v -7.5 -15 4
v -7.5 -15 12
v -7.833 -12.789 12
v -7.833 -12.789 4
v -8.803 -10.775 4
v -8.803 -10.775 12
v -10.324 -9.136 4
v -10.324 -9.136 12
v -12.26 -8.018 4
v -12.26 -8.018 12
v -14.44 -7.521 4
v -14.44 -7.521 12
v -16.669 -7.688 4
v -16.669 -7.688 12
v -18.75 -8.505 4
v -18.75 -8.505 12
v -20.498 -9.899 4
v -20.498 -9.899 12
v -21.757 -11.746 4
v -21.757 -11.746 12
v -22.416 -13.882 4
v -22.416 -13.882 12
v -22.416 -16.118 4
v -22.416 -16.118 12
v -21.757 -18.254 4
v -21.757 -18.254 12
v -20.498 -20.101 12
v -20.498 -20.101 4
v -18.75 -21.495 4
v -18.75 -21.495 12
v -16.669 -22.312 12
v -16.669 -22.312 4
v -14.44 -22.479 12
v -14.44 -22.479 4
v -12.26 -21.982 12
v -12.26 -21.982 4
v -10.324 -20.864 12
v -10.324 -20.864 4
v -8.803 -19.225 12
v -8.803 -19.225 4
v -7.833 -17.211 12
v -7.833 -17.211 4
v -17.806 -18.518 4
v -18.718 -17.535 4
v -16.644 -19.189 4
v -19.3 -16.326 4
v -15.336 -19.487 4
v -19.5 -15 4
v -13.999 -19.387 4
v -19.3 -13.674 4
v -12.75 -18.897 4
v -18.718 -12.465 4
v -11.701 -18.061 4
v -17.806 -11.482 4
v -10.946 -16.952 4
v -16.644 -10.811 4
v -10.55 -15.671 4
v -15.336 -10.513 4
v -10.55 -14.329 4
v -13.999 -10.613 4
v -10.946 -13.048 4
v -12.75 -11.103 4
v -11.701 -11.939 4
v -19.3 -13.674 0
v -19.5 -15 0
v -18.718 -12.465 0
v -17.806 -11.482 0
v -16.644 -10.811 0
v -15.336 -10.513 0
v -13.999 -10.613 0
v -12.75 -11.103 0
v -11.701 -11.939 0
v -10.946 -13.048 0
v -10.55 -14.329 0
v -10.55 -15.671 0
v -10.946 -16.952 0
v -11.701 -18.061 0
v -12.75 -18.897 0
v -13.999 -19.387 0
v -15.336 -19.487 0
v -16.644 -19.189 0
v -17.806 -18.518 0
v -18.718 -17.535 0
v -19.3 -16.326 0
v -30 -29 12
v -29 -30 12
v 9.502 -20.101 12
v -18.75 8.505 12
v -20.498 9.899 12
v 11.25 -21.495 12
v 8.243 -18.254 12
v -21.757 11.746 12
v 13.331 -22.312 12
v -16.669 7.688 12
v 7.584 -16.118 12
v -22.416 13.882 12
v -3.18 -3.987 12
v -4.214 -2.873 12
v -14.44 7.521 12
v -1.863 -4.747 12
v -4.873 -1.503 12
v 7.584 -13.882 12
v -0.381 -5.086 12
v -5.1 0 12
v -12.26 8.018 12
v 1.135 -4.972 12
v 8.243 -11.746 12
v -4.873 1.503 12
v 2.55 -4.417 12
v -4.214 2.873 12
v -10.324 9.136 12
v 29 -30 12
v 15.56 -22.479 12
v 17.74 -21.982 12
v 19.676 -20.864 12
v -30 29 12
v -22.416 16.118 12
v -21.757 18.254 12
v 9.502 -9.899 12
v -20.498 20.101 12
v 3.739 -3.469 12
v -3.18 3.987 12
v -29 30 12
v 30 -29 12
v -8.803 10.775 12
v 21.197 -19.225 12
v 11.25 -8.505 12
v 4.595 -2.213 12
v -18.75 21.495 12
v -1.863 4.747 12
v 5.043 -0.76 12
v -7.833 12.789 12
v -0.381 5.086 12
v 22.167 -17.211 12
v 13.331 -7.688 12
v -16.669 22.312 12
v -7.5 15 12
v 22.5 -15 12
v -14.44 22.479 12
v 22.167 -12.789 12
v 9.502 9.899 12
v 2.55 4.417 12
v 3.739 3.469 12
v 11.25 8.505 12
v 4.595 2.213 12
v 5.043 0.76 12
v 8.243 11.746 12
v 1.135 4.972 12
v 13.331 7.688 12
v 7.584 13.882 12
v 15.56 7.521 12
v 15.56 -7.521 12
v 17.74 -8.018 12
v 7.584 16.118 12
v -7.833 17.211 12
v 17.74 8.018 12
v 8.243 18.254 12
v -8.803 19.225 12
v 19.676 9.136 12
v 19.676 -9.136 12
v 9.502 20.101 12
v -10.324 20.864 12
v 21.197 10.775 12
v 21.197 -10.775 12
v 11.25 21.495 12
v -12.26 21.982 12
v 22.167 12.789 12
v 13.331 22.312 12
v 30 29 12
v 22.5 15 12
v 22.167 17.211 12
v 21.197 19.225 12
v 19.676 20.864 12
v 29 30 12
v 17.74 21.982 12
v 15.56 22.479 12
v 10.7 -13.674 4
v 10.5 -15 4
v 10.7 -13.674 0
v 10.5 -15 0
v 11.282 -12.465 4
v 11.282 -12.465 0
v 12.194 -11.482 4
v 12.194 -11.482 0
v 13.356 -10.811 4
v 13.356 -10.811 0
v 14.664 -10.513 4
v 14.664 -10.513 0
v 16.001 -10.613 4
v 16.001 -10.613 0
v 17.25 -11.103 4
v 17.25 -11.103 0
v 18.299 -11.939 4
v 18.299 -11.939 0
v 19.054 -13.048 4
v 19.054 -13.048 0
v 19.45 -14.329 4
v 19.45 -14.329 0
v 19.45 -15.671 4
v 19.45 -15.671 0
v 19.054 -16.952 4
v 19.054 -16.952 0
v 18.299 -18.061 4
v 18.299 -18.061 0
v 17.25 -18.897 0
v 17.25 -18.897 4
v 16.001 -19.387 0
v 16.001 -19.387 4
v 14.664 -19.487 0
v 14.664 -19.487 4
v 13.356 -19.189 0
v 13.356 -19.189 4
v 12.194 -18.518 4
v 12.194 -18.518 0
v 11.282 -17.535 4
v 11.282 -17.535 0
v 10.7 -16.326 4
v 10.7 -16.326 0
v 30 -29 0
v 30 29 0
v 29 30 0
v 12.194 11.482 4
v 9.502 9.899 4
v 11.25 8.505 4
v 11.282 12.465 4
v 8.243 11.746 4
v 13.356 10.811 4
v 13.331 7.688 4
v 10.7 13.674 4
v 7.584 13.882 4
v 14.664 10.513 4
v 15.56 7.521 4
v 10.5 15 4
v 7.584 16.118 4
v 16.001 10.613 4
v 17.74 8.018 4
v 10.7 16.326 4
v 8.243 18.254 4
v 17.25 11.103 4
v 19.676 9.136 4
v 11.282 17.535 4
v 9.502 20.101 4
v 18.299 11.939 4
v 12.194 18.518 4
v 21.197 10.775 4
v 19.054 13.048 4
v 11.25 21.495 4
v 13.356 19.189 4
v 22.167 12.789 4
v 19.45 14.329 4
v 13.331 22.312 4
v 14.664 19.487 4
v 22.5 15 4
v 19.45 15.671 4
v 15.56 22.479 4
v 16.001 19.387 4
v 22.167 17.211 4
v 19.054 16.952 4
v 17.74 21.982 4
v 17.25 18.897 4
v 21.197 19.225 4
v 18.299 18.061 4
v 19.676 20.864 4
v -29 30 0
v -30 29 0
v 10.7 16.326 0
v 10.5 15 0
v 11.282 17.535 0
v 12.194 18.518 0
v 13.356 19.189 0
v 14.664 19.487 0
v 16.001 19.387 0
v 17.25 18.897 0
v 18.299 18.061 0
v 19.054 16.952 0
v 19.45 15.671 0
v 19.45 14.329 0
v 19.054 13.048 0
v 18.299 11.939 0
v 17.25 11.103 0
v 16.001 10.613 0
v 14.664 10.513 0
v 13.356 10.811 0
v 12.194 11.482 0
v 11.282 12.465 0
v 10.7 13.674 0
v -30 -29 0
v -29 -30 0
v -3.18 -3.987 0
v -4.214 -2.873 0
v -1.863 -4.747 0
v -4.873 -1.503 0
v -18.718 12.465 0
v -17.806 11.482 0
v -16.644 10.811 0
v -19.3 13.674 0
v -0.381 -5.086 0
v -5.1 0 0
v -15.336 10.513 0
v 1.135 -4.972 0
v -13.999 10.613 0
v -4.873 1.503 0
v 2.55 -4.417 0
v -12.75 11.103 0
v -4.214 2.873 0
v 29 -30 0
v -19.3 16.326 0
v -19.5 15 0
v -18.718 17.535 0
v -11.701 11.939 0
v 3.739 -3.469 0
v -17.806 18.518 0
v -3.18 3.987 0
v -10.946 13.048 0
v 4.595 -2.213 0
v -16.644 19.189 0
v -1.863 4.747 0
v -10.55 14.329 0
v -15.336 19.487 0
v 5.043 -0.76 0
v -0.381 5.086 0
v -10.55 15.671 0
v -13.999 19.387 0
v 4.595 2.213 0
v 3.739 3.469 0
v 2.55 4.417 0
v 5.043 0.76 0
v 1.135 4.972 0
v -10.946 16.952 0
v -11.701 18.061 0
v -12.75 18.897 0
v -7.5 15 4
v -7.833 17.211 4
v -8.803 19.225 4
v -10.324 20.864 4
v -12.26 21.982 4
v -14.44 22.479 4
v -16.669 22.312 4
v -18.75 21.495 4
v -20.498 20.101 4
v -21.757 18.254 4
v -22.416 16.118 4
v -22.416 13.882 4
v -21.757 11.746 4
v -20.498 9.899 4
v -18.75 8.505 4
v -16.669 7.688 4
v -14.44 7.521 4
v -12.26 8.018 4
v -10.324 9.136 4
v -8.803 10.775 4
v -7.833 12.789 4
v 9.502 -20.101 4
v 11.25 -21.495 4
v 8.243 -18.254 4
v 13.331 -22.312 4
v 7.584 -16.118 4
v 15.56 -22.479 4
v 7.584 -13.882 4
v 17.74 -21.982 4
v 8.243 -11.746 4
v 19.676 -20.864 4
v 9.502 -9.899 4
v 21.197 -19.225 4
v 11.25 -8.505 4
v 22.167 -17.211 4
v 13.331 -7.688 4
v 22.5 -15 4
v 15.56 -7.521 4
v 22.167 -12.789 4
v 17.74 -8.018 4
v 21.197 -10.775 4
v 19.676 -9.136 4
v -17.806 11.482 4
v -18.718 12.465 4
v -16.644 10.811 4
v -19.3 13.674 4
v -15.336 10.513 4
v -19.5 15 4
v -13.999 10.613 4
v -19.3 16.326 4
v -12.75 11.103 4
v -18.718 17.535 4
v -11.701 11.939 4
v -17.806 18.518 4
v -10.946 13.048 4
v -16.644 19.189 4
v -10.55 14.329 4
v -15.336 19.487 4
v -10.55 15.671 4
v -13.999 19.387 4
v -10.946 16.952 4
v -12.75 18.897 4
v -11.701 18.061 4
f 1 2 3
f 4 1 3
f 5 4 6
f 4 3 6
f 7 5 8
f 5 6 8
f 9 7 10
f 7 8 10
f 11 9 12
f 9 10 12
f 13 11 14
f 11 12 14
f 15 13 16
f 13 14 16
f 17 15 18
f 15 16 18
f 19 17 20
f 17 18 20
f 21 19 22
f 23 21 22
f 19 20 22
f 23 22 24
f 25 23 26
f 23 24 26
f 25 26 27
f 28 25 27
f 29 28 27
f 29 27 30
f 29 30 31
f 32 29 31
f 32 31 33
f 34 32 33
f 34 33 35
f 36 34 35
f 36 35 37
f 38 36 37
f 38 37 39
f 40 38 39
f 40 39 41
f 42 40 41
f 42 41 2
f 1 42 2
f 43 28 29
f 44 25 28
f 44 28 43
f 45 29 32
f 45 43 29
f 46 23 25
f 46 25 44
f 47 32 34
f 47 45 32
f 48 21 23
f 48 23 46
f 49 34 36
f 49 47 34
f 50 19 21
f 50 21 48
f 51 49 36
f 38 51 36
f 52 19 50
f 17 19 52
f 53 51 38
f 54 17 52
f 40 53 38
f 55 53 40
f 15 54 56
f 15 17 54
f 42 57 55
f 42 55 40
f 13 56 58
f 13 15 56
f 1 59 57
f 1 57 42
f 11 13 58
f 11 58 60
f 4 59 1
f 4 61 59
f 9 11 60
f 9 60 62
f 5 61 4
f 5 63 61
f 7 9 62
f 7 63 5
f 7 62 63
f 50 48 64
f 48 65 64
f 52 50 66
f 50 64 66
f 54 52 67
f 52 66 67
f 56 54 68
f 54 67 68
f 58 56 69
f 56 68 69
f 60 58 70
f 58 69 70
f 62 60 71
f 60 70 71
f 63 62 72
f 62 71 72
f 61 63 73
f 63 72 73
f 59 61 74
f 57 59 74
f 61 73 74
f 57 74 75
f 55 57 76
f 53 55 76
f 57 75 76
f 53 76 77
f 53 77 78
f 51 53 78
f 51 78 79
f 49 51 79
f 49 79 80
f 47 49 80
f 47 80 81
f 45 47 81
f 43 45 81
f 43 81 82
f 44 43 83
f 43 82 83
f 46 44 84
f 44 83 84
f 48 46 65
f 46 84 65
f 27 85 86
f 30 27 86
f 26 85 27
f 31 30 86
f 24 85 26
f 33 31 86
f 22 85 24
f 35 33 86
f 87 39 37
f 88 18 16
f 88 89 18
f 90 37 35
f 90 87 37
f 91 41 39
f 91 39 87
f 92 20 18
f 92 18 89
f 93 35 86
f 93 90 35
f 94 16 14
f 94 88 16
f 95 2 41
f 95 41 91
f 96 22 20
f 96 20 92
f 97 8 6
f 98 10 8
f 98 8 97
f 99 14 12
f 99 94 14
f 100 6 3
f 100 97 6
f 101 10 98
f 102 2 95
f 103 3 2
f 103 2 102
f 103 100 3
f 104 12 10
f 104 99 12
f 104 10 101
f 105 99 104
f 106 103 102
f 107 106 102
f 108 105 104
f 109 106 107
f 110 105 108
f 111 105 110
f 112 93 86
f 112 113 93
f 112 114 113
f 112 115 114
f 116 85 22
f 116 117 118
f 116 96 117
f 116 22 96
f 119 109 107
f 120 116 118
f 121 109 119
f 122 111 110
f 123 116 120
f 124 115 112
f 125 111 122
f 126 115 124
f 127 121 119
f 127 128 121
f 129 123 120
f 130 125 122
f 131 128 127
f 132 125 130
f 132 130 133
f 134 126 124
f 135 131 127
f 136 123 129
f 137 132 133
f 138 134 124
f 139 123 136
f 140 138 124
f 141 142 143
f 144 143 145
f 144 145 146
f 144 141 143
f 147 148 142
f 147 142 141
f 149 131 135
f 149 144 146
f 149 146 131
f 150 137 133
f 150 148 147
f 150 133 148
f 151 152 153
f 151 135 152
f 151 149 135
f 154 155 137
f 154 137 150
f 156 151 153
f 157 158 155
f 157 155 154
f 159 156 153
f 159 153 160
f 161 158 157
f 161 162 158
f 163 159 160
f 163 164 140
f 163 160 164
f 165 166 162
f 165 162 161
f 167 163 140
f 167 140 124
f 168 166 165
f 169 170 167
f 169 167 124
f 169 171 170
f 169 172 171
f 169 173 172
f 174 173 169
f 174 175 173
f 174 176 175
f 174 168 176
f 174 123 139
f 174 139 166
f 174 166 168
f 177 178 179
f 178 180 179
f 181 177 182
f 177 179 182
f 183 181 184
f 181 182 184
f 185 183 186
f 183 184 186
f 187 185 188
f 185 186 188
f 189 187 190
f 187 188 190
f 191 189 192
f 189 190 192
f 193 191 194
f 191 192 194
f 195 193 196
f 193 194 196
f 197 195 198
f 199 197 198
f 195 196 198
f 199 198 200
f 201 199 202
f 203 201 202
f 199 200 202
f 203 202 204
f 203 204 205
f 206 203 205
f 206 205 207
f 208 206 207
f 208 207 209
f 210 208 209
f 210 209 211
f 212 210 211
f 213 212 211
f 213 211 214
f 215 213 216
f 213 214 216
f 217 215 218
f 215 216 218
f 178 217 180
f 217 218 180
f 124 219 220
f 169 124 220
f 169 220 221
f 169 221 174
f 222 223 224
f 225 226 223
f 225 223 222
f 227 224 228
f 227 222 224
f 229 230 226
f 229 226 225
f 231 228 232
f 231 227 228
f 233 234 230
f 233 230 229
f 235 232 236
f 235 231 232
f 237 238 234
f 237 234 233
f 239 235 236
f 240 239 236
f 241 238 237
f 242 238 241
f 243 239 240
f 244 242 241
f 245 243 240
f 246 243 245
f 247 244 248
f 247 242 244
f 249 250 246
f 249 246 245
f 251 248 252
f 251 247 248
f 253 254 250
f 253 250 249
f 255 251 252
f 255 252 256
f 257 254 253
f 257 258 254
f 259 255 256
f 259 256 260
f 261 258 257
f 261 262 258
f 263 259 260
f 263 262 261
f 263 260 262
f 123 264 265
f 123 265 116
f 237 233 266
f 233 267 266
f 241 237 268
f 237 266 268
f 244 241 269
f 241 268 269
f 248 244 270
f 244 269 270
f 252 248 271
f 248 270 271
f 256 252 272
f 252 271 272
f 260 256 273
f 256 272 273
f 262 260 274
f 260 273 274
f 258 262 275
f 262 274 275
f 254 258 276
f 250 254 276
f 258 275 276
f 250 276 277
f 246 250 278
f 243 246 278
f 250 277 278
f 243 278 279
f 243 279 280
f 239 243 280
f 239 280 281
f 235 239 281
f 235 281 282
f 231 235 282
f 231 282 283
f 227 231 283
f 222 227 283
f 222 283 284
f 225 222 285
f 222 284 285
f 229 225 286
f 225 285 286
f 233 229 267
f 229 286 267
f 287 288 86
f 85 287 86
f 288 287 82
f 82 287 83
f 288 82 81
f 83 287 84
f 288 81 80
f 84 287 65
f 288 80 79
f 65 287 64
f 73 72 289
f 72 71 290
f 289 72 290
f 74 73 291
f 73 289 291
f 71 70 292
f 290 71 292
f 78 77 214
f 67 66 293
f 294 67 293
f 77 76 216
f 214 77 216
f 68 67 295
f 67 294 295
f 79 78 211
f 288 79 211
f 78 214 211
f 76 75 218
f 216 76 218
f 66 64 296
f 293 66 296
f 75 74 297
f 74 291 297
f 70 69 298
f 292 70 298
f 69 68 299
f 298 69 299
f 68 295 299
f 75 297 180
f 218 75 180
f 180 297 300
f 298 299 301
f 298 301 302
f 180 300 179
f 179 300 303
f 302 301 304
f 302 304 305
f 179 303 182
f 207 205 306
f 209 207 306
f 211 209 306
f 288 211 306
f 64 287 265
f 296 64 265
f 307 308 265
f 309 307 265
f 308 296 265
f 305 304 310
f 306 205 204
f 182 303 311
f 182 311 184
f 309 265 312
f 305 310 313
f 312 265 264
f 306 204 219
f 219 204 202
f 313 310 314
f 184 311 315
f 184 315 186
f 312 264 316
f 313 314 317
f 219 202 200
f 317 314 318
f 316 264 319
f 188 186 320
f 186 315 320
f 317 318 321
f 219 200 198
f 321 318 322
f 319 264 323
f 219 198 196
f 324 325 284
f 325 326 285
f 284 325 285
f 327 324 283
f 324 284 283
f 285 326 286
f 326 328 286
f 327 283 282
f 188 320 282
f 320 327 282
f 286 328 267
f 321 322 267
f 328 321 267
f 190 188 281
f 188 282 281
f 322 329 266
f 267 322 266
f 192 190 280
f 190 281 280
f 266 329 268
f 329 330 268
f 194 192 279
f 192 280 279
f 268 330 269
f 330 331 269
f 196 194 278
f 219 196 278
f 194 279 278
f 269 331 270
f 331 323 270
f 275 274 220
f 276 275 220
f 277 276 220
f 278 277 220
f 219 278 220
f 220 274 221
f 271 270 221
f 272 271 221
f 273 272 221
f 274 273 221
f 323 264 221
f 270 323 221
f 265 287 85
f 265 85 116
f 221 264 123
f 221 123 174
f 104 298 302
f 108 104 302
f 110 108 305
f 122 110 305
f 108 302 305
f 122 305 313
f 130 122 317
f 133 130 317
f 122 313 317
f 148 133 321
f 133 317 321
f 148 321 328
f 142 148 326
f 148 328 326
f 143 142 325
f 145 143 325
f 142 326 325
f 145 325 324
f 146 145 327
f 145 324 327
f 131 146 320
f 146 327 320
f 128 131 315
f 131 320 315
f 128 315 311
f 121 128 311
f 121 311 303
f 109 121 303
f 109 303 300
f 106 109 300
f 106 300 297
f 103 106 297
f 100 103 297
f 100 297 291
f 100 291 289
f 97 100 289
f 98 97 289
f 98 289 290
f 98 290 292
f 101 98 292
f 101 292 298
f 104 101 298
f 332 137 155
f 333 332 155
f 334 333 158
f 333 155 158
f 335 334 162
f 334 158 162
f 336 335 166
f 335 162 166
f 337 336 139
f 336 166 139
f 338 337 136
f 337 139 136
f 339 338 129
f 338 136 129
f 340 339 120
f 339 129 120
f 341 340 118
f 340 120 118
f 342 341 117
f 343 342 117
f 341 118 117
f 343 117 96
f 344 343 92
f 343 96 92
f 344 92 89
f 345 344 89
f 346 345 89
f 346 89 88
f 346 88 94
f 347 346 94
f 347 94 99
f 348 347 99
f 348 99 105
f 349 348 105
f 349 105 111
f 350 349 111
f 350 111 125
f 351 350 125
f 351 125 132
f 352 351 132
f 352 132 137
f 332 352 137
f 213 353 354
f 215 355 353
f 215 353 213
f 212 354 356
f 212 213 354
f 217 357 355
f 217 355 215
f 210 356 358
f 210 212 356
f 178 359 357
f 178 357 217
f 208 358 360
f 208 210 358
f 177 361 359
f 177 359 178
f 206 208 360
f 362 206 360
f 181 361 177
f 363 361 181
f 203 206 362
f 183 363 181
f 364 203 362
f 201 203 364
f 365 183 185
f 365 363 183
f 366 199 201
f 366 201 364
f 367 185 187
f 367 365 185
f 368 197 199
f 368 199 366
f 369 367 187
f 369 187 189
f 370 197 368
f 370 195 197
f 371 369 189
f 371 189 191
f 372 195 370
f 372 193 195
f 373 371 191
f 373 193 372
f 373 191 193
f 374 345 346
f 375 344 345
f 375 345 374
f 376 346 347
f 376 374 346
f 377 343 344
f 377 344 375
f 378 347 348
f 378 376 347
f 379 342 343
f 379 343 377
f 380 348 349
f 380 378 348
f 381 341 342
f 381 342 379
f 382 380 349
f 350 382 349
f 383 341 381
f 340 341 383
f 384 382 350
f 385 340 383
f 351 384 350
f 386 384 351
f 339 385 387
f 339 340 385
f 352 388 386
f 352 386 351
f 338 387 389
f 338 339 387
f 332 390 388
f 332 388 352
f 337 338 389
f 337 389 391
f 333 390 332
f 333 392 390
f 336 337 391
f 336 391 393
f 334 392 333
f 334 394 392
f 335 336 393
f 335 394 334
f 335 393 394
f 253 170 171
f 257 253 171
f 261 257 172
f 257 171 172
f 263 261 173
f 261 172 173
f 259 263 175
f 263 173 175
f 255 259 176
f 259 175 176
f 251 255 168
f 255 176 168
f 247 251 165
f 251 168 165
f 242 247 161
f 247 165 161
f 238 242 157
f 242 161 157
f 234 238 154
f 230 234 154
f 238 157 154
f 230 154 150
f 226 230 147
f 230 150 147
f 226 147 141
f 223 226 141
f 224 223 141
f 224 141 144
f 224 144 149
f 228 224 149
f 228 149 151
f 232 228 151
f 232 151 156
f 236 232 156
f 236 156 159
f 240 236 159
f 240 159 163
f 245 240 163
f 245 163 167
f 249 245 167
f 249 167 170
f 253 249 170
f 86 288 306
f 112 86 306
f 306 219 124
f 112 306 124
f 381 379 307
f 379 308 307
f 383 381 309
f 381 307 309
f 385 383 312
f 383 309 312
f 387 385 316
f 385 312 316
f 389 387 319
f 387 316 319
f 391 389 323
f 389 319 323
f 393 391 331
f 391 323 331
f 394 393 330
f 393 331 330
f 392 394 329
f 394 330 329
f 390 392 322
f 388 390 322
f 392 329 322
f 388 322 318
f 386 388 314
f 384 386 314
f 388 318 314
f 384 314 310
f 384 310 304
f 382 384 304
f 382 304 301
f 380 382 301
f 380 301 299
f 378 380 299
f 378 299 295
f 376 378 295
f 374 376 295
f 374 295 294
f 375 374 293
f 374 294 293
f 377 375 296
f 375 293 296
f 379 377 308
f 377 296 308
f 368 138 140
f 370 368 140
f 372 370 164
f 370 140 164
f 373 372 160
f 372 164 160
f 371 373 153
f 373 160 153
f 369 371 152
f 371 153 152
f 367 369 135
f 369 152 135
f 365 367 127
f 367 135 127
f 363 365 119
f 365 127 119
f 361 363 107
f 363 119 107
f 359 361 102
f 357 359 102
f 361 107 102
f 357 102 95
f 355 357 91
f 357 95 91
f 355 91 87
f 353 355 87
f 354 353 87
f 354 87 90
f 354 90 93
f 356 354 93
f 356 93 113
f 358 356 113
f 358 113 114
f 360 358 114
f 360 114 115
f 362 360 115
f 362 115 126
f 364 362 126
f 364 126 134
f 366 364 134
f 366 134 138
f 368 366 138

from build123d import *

# Parameters (mm, degrees)
SKETCH1_W                      = 60
SKETCH1_H                      = 60
BOSS_EXTRUDE1_DEPTH            = 12
M12X1_75_TAPPED_HOLE1_D        = 10.2
CBORE_FOR_M8_SHCS1_D           = 9
CBORE_FOR_M8_SHCS1_CBORE_D     = 15
CBORE_FOR_M8_SHCS1_CBORE_DEPTH = 8
CHAMFER1_SIZE                  = 1


with BuildPart() as part:
    # Sketch1 → Boss-Extrude1 (new body)
    with BuildSketch(Plane.XY):
        Rectangle(SKETCH1_W, SKETCH1_H)
    extrude(amount=BOSS_EXTRUDE1_DEPTH)

    # M12x1.75 Tapped Hole1 (through all)
    with Locations(Plane.XY.offset(12)):
        with Locations((0, 0)):
            Hole(M12X1_75_TAPPED_HOLE1_D / 2)

    # CBORE for M8 SHCS1 (through all)
    with Locations(Plane.XY.offset(12)):
        with Locations((-15, 15), (15, 15), (15, -15), (-15, -15)):
            CounterBoreHole(CBORE_FOR_M8_SHCS1_D / 2, CBORE_FOR_M8_SHCS1_CBORE_D / 2, CBORE_FOR_M8_SHCS1_CBORE_DEPTH)

    # Chamfer1
    chamfer1_edges = [part.edges().sort_by_distance(p)[0] for p in [
        (30, -30, 6),
        (-30, -30, 6),
        (-30, 30, 6),
        (30, 30, 6),
    ]]
    chamfer(chamfer1_edges, length=CHAMFER1_SIZE)


solid = part.part
